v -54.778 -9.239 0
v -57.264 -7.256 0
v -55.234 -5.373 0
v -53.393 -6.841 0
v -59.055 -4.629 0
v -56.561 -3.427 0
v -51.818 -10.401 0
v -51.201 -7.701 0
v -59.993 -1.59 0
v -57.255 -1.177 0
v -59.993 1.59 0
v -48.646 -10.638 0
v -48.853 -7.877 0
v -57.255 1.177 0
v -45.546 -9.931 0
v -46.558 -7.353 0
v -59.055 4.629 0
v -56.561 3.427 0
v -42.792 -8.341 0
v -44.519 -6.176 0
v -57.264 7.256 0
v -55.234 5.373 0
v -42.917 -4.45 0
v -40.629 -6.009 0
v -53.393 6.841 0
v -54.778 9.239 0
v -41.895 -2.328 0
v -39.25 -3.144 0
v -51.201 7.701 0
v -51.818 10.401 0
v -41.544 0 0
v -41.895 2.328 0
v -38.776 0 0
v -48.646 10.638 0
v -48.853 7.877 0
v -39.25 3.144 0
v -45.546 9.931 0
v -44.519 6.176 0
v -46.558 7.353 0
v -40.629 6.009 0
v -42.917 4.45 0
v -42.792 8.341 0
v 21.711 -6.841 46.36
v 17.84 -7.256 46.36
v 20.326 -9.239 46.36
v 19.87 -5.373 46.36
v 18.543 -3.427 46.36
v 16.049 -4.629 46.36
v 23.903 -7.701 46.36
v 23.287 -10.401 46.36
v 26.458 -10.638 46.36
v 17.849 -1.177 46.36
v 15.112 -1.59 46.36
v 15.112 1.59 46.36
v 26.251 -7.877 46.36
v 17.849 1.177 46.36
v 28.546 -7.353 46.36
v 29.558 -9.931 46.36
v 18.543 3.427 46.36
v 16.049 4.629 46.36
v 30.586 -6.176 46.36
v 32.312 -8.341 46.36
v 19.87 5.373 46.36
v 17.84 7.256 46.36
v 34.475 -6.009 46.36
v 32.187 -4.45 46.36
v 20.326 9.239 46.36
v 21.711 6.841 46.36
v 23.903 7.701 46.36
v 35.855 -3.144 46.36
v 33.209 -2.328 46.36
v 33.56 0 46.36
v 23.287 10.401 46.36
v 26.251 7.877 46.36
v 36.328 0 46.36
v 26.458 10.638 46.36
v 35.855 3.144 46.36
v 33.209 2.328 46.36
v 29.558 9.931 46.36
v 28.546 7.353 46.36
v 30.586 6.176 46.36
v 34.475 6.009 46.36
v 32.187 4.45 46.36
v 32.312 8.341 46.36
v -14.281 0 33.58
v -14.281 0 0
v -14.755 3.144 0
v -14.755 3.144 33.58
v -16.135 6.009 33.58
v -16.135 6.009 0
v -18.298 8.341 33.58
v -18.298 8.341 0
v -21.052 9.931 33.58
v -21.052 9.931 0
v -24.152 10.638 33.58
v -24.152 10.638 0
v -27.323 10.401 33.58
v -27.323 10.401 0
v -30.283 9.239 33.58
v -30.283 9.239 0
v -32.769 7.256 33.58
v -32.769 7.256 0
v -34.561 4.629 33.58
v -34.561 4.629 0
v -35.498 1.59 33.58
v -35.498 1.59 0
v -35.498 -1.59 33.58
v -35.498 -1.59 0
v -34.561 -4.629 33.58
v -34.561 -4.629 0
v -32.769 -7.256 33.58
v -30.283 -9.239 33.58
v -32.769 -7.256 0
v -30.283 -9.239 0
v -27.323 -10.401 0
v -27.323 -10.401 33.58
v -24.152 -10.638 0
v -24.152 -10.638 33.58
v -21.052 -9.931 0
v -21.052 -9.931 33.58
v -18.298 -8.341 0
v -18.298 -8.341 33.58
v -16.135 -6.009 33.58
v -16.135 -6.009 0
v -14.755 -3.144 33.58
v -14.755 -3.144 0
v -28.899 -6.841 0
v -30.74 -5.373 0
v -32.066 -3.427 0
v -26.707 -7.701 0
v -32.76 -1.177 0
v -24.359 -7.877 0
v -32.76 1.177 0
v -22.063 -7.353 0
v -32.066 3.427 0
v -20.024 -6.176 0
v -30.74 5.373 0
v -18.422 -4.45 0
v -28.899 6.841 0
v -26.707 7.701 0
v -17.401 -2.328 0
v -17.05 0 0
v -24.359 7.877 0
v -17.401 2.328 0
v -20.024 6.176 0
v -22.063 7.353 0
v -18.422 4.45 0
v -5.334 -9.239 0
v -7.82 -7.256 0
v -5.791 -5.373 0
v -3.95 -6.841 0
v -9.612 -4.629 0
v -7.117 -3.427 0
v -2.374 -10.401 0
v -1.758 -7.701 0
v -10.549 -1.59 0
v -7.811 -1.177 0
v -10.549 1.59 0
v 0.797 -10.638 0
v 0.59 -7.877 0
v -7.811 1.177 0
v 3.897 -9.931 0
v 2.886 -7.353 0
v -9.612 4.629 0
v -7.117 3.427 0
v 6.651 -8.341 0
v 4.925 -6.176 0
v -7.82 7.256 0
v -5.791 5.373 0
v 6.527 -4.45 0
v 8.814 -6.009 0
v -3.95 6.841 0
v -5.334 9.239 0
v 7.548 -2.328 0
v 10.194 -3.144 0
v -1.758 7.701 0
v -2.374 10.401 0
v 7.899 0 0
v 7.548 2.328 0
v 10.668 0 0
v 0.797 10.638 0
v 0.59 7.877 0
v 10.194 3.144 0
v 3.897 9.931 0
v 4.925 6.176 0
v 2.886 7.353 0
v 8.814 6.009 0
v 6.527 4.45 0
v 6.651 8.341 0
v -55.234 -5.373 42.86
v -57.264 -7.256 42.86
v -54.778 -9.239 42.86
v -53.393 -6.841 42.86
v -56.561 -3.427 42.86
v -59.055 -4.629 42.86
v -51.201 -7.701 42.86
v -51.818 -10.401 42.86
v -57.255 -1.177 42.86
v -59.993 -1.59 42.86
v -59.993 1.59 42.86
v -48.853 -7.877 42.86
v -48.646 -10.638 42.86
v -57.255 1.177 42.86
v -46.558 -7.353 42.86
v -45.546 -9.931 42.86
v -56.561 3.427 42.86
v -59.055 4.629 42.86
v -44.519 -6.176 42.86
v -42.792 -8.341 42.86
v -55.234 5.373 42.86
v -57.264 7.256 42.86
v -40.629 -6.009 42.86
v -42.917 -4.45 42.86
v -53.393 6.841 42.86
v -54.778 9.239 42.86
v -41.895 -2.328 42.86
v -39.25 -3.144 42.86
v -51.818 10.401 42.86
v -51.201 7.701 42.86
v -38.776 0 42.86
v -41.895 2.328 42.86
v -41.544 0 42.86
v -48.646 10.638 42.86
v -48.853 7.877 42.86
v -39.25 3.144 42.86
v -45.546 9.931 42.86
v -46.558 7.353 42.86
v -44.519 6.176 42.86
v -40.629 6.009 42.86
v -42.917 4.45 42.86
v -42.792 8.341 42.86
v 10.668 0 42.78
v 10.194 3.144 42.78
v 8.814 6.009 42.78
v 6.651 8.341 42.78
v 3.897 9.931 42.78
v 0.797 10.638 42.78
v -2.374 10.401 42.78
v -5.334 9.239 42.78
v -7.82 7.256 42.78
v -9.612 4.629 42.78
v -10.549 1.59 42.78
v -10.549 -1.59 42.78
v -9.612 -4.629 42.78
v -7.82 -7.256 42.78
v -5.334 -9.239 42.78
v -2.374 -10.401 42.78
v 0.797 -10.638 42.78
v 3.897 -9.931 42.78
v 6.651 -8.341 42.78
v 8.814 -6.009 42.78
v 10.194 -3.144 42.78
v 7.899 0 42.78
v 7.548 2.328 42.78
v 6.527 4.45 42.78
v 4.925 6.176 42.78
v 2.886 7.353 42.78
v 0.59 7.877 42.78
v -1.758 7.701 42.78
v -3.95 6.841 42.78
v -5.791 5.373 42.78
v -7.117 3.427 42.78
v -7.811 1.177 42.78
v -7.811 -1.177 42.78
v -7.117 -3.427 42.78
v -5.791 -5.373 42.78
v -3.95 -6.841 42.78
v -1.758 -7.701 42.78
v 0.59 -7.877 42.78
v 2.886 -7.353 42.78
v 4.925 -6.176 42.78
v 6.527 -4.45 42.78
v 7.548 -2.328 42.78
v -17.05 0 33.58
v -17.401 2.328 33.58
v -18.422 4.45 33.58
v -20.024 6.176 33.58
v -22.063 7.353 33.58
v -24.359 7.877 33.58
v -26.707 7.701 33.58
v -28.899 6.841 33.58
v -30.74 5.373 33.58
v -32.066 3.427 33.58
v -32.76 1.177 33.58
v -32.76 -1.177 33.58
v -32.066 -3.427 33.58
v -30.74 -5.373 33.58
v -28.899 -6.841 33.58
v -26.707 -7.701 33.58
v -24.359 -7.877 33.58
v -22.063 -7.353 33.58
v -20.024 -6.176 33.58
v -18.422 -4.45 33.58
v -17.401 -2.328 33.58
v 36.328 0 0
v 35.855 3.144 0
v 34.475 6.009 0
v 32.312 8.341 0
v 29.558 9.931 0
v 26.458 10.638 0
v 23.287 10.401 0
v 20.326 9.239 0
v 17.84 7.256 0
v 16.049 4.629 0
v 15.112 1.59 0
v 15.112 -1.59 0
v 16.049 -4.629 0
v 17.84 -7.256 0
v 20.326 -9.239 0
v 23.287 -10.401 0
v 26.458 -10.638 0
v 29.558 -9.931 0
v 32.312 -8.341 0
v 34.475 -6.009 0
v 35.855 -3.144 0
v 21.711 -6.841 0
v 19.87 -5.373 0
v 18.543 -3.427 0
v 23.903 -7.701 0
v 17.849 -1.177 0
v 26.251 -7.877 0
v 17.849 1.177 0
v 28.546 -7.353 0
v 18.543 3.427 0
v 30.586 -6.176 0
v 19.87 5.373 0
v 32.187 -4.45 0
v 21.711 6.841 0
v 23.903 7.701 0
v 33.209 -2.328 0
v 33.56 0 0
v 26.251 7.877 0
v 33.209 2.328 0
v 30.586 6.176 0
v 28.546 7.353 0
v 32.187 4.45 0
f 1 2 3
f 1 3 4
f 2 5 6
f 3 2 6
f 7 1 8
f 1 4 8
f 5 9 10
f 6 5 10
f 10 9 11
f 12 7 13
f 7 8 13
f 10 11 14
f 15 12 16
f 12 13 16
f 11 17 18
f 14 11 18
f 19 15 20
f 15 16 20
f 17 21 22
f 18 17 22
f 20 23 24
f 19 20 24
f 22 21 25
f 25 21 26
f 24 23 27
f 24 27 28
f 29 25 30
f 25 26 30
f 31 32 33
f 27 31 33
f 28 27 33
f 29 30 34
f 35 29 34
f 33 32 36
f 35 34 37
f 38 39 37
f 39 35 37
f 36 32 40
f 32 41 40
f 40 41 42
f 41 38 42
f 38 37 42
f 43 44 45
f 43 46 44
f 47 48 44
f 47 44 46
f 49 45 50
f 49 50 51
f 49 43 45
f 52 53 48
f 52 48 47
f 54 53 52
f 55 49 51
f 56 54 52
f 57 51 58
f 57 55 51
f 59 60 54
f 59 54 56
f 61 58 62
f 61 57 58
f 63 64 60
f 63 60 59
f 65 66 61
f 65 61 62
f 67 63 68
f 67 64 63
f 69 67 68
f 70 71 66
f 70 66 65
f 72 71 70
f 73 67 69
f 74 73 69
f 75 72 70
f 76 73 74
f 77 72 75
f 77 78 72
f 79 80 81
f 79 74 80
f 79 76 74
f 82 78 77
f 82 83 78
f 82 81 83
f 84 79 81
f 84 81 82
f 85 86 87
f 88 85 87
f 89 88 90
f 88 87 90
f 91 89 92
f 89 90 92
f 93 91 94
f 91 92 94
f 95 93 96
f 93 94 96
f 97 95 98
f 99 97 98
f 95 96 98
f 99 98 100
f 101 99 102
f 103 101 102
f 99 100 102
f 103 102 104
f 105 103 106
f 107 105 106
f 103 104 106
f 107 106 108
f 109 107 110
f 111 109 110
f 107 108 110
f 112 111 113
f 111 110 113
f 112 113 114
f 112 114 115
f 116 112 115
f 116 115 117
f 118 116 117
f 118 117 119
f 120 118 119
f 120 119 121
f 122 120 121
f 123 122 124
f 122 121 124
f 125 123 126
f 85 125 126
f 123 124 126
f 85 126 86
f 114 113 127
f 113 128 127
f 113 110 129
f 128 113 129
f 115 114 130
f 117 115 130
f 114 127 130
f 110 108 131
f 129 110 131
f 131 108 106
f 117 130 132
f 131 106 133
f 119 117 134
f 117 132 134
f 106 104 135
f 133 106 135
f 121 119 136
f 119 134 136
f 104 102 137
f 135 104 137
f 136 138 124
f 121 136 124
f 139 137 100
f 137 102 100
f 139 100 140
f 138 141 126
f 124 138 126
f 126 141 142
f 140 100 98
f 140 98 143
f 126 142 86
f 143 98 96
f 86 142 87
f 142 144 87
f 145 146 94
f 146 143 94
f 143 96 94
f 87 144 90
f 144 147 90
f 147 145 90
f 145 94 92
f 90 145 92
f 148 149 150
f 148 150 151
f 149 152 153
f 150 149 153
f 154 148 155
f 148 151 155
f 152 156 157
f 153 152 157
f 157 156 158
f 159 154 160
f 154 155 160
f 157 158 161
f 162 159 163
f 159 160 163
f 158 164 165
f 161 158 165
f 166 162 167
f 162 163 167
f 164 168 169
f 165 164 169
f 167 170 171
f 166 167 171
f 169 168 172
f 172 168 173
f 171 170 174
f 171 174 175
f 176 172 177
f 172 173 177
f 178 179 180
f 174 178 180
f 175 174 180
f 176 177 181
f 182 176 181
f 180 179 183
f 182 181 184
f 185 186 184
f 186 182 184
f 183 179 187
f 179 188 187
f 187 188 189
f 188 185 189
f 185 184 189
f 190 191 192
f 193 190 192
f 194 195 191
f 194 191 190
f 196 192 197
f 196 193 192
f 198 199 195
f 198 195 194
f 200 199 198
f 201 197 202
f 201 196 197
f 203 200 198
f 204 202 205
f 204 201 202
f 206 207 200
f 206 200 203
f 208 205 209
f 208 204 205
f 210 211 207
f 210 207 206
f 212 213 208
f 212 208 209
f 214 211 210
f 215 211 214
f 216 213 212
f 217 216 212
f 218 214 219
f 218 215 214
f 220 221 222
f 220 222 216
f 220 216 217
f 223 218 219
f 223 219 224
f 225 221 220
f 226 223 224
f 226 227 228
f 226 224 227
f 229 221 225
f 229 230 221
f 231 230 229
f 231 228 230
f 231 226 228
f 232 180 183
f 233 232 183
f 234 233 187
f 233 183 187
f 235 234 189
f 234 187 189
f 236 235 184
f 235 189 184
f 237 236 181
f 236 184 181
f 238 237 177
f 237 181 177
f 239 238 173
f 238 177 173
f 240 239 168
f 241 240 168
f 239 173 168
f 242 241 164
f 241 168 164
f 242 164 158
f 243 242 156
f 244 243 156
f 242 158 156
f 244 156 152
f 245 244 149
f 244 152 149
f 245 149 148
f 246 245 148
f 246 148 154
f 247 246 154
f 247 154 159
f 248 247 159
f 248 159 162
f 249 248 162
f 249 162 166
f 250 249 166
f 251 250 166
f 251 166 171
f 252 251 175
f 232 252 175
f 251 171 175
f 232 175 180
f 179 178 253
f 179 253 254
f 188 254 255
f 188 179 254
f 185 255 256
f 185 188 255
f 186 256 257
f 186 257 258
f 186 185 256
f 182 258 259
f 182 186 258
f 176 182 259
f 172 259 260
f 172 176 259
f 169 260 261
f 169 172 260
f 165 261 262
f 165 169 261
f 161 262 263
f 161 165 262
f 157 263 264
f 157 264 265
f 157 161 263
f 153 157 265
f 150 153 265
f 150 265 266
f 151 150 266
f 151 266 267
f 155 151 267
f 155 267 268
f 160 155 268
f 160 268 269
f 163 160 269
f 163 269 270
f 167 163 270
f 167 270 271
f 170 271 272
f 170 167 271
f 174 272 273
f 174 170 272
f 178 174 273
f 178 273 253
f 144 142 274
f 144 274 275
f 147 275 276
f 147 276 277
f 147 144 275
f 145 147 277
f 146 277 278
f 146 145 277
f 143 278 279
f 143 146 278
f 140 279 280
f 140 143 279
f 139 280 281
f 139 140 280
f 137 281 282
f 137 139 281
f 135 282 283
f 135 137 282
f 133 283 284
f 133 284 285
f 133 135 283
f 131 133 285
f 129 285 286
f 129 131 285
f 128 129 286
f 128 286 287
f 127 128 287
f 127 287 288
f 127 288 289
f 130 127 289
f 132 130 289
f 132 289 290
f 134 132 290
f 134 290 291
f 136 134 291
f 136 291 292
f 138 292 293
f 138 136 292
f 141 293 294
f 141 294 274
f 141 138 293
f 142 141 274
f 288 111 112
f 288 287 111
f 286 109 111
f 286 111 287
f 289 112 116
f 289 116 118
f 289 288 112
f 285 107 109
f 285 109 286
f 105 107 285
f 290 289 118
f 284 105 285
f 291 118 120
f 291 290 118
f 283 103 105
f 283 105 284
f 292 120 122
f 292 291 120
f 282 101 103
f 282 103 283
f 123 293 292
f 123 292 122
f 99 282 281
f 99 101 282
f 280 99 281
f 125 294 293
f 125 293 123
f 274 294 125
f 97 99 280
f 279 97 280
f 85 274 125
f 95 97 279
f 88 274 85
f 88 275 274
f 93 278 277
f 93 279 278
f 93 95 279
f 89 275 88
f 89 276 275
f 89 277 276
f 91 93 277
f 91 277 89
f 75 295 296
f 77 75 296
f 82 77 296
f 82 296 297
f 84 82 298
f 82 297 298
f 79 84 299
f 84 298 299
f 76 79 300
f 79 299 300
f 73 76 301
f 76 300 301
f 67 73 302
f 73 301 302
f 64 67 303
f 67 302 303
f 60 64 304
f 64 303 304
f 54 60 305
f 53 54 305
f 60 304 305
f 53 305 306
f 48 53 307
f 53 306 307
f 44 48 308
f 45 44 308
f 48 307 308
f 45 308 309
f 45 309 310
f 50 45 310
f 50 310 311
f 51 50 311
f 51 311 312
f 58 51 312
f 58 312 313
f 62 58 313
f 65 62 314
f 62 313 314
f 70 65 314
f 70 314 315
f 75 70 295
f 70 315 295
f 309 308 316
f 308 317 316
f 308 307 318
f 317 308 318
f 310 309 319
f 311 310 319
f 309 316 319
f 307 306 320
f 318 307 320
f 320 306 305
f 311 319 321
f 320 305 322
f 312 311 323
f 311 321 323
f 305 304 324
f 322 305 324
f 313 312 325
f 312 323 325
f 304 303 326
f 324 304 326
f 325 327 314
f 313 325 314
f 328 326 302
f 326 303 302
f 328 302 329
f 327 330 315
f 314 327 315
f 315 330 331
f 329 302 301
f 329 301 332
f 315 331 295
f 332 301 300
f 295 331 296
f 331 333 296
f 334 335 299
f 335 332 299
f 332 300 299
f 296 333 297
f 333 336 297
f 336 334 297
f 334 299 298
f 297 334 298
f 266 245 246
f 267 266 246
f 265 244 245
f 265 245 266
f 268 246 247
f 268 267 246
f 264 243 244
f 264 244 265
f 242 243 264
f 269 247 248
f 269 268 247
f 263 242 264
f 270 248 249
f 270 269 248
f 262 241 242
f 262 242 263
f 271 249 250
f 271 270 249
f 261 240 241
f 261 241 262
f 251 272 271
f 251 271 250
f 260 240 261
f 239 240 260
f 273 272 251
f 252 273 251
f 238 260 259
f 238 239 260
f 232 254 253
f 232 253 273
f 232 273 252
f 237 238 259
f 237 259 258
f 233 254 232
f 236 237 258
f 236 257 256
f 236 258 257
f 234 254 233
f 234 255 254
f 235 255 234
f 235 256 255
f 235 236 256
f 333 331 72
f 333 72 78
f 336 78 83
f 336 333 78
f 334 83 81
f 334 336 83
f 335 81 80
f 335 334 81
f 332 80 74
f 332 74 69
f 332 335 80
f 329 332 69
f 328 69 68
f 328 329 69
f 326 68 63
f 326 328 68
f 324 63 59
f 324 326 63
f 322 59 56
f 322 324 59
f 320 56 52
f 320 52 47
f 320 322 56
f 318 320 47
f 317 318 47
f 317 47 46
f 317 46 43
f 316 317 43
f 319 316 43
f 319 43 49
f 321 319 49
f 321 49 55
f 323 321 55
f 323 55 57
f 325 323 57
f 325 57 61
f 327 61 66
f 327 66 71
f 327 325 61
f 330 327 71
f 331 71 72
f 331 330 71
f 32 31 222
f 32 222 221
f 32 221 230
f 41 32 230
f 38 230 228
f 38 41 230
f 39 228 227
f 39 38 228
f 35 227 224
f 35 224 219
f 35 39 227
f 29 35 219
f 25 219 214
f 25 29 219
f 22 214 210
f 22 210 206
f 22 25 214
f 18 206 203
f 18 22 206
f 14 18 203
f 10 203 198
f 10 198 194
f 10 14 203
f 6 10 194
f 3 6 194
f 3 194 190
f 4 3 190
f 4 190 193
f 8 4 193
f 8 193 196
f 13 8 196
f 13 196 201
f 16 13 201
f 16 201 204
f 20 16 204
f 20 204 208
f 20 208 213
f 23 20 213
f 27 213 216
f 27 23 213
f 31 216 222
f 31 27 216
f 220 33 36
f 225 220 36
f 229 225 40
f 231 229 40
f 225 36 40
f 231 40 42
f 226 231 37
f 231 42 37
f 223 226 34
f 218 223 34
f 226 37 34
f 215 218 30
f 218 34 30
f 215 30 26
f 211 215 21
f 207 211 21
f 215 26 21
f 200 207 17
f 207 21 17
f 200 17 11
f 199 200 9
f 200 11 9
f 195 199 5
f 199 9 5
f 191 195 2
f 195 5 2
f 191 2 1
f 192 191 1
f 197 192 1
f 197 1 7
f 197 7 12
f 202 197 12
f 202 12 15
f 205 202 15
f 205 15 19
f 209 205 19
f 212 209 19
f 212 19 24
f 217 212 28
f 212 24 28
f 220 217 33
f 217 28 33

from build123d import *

# Parameters (mm, degrees)
F0_R     = 10.668
F0_R_2   = 7.8994
F1_DEPTH = 42.78
F2_R     = 10.668
F2_R_2   = 7.8994
F3_DEPTH = 33.58
F4_R     = 10.668
F4_R_2   = 7.8994
F5_DEPTH = 42.86
F6_R     = 10.668
F6_R_2   = 7.8994
F7_DEPTH = 46.36


with BuildPart() as f1:
    # F0 (on Top) → F1 (new body)
    with BuildSketch(Plane.XY):
        Circle(F0_R)
        Circle(F0_R_2, mode=Mode.SUBTRACT)
    extrude(amount=F1_DEPTH)


with BuildPart() as f3:
    # F2 (on Top) → F3 (new body)
    with BuildSketch(Plane.XY):
        with Locations((-24.949171, 0)):
            Circle(F2_R)
        with Locations((-24.949171, 0)):
            Circle(F2_R_2, mode=Mode.SUBTRACT)
    extrude(amount=F3_DEPTH)


with BuildPart() as f5:
    # F4 (on Top) → F5 (new body)
    with BuildSketch(Plane.XY):
        with Locations((-49.443699, 0)):
            Circle(F4_R)
        with Locations((-49.443699, 0)):
            Circle(F4_R_2, mode=Mode.SUBTRACT)
    extrude(amount=F5_DEPTH)


with BuildPart() as f7:
    # F6 (on Top) → F7 (new body)
    with BuildSketch(Plane.XY):
        with Locations((25.660496, 0)):
            Circle(F6_R)
        with Locations((25.660496, 0)):
            Circle(F6_R_2, mode=Mode.SUBTRACT)
    extrude(amount=F7_DEPTH)


solid = Compound([f1.part, f3.part, f5.part, f7.part])
